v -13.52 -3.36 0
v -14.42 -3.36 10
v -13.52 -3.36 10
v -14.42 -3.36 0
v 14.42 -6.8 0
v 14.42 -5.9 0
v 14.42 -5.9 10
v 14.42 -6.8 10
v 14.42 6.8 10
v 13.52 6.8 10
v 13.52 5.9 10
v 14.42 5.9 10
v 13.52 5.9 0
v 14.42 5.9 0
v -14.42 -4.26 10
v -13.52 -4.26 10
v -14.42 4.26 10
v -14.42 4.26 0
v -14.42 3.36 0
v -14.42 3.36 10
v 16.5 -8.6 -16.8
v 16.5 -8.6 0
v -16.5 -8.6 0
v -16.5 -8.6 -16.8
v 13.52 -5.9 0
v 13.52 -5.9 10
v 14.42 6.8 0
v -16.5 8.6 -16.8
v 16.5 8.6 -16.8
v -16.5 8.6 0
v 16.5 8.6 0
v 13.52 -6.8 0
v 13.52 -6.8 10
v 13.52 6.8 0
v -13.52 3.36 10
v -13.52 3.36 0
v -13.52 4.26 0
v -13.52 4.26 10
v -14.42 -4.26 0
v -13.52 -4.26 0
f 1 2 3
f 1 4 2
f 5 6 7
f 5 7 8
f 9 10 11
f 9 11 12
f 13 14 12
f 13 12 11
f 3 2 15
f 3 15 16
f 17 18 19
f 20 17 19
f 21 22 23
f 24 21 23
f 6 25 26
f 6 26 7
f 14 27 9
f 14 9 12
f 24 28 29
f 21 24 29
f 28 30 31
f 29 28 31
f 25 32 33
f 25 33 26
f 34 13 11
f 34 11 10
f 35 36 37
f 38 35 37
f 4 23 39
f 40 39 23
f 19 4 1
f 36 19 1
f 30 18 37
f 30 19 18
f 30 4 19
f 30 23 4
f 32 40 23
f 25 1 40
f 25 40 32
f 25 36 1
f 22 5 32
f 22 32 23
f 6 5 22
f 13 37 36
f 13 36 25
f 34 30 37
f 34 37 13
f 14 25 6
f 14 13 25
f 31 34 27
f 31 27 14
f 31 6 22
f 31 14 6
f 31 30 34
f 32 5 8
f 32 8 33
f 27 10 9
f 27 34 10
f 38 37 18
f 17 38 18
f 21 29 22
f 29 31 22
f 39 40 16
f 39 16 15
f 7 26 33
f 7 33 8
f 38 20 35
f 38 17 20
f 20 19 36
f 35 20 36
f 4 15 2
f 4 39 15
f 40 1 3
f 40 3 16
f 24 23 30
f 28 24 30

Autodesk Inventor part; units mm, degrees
ref_plane "YZ Plane" through (0, 0, 0) normal (1, 0, 0) x (0, 1, 0)
ref_plane "XZ Plane" through (0, 0, 0) normal (0, 1, 0) x (-1, 0, 0)
ref_plane "XY Plane" through (0, 0, 0) normal (0, 0, 1) x (1, 0, 0)
sketch "스케치1" plane through (0, 0, 0) normal (0, 0, 1) x (1, 0, 0)
  line L0 (-16.5, 8.6) -> (16.5, 8.6)
  line L1 (16.5, 8.6) -> (16.5, -8.6)
  line L2 (16.5, -8.6) -> (-16.5, -8.6)
  line L3 (-16.5, -8.6) -> (-16.5, 8.6)
  line L4 (-16.5, 8.6) -> (16.5, -8.6) construction
  line L5 (16.5, 8.6) -> (-16.5, -8.6) construction
  line L6 (13.52, 6.8) -> (14.42, 6.8)
  line L7 (14.42, 6.8) -> (14.42, 5.9)
  line L8 (14.42, 5.9) -> (13.52, 5.9)
  line L9 (13.52, 5.9) -> (13.52, 6.8)
  line L10 (13.52, 6.8) -> (14.42, 5.9) construction
  line L11 (14.42, 6.8) -> (13.52, 5.9) construction
  line L12 (13.52, -5.9) -> (14.42, -5.9)
  line L13 (14.42, -5.9) -> (14.42, -6.8)
  line L14 (14.42, -6.8) -> (13.52, -6.8)
  line L15 (13.52, -6.8) -> (13.52, -5.9)
  line L16 (13.52, -5.9) -> (14.42, -6.8) construction
  line L17 (14.42, -5.9) -> (13.52, -6.8) construction
  line L18 (-14.42, 3.36) -> (-13.52, 3.36)
  line L19 (-13.52, 3.36) -> (-13.52, 4.26)
  line L20 (-13.52, 4.26) -> (-14.42, 4.26)
  line L21 (-14.42, 4.26) -> (-14.42, 3.36)
  line L22 (-14.42, 3.36) -> (-13.52, 4.26) construction
  line L23 (-13.52, 3.36) -> (-14.42, 4.26) construction
  line L24 (-14.42, -3.36) -> (-13.52, -3.36)
  line L25 (-13.52, -3.36) -> (-13.52, -4.26)
  line L26 (-13.52, -4.26) -> (-14.42, -4.26)
  line L27 (-14.42, -4.26) -> (-14.42, -3.36)
  line L28 (-14.42, -3.36) -> (-13.52, -4.26) construction
  line L29 (-13.52, -3.36) -> (-14.42, -4.26) construction
  point P0 (0, 0)
  point P1 (13.97, 6.35)
  point P2 (13.97, -6.35)
  point P3 (-13.97, 3.81)
  point P4 (-13.97, -3.81)
  dimension "d0" = 33
  dimension "d1" = 17.2
  dimension "d2" = 2.25
  dimension "d3" = 12.7
  dimension "d4" = 0.9
  dimension "d5" = 0.9
  dimension "d6" = 0.9
  dimension "d7" = 0.9
  dimension "d8" = 0.9
  dimension "d9" = 0.9
  dimension "d10" = 0.9
  dimension "d11" = 0.9
  dimension "d12" = 4.79
  dimension "d13" = 7.62
  dimension "d14" = 2.53
  dimension "d15" = 27.94
extrude "돌출1" add sketch "스케치1" against normal blind 16.8 contours L0 L1 L2 L3 | L6 L7 L8 L9 | L12 L13 L14 L15 | L21 L20 L19 L18 | L24 L25 L26 L27
extrude "돌출2" add sketch "스케치1" along normal blind 10 contours L6 L7 L8 L9 | L12 L13 L14 L15 | L21 L20 L19 L18 | L24 L25 L26 L27
properties part number "GMS0205"
